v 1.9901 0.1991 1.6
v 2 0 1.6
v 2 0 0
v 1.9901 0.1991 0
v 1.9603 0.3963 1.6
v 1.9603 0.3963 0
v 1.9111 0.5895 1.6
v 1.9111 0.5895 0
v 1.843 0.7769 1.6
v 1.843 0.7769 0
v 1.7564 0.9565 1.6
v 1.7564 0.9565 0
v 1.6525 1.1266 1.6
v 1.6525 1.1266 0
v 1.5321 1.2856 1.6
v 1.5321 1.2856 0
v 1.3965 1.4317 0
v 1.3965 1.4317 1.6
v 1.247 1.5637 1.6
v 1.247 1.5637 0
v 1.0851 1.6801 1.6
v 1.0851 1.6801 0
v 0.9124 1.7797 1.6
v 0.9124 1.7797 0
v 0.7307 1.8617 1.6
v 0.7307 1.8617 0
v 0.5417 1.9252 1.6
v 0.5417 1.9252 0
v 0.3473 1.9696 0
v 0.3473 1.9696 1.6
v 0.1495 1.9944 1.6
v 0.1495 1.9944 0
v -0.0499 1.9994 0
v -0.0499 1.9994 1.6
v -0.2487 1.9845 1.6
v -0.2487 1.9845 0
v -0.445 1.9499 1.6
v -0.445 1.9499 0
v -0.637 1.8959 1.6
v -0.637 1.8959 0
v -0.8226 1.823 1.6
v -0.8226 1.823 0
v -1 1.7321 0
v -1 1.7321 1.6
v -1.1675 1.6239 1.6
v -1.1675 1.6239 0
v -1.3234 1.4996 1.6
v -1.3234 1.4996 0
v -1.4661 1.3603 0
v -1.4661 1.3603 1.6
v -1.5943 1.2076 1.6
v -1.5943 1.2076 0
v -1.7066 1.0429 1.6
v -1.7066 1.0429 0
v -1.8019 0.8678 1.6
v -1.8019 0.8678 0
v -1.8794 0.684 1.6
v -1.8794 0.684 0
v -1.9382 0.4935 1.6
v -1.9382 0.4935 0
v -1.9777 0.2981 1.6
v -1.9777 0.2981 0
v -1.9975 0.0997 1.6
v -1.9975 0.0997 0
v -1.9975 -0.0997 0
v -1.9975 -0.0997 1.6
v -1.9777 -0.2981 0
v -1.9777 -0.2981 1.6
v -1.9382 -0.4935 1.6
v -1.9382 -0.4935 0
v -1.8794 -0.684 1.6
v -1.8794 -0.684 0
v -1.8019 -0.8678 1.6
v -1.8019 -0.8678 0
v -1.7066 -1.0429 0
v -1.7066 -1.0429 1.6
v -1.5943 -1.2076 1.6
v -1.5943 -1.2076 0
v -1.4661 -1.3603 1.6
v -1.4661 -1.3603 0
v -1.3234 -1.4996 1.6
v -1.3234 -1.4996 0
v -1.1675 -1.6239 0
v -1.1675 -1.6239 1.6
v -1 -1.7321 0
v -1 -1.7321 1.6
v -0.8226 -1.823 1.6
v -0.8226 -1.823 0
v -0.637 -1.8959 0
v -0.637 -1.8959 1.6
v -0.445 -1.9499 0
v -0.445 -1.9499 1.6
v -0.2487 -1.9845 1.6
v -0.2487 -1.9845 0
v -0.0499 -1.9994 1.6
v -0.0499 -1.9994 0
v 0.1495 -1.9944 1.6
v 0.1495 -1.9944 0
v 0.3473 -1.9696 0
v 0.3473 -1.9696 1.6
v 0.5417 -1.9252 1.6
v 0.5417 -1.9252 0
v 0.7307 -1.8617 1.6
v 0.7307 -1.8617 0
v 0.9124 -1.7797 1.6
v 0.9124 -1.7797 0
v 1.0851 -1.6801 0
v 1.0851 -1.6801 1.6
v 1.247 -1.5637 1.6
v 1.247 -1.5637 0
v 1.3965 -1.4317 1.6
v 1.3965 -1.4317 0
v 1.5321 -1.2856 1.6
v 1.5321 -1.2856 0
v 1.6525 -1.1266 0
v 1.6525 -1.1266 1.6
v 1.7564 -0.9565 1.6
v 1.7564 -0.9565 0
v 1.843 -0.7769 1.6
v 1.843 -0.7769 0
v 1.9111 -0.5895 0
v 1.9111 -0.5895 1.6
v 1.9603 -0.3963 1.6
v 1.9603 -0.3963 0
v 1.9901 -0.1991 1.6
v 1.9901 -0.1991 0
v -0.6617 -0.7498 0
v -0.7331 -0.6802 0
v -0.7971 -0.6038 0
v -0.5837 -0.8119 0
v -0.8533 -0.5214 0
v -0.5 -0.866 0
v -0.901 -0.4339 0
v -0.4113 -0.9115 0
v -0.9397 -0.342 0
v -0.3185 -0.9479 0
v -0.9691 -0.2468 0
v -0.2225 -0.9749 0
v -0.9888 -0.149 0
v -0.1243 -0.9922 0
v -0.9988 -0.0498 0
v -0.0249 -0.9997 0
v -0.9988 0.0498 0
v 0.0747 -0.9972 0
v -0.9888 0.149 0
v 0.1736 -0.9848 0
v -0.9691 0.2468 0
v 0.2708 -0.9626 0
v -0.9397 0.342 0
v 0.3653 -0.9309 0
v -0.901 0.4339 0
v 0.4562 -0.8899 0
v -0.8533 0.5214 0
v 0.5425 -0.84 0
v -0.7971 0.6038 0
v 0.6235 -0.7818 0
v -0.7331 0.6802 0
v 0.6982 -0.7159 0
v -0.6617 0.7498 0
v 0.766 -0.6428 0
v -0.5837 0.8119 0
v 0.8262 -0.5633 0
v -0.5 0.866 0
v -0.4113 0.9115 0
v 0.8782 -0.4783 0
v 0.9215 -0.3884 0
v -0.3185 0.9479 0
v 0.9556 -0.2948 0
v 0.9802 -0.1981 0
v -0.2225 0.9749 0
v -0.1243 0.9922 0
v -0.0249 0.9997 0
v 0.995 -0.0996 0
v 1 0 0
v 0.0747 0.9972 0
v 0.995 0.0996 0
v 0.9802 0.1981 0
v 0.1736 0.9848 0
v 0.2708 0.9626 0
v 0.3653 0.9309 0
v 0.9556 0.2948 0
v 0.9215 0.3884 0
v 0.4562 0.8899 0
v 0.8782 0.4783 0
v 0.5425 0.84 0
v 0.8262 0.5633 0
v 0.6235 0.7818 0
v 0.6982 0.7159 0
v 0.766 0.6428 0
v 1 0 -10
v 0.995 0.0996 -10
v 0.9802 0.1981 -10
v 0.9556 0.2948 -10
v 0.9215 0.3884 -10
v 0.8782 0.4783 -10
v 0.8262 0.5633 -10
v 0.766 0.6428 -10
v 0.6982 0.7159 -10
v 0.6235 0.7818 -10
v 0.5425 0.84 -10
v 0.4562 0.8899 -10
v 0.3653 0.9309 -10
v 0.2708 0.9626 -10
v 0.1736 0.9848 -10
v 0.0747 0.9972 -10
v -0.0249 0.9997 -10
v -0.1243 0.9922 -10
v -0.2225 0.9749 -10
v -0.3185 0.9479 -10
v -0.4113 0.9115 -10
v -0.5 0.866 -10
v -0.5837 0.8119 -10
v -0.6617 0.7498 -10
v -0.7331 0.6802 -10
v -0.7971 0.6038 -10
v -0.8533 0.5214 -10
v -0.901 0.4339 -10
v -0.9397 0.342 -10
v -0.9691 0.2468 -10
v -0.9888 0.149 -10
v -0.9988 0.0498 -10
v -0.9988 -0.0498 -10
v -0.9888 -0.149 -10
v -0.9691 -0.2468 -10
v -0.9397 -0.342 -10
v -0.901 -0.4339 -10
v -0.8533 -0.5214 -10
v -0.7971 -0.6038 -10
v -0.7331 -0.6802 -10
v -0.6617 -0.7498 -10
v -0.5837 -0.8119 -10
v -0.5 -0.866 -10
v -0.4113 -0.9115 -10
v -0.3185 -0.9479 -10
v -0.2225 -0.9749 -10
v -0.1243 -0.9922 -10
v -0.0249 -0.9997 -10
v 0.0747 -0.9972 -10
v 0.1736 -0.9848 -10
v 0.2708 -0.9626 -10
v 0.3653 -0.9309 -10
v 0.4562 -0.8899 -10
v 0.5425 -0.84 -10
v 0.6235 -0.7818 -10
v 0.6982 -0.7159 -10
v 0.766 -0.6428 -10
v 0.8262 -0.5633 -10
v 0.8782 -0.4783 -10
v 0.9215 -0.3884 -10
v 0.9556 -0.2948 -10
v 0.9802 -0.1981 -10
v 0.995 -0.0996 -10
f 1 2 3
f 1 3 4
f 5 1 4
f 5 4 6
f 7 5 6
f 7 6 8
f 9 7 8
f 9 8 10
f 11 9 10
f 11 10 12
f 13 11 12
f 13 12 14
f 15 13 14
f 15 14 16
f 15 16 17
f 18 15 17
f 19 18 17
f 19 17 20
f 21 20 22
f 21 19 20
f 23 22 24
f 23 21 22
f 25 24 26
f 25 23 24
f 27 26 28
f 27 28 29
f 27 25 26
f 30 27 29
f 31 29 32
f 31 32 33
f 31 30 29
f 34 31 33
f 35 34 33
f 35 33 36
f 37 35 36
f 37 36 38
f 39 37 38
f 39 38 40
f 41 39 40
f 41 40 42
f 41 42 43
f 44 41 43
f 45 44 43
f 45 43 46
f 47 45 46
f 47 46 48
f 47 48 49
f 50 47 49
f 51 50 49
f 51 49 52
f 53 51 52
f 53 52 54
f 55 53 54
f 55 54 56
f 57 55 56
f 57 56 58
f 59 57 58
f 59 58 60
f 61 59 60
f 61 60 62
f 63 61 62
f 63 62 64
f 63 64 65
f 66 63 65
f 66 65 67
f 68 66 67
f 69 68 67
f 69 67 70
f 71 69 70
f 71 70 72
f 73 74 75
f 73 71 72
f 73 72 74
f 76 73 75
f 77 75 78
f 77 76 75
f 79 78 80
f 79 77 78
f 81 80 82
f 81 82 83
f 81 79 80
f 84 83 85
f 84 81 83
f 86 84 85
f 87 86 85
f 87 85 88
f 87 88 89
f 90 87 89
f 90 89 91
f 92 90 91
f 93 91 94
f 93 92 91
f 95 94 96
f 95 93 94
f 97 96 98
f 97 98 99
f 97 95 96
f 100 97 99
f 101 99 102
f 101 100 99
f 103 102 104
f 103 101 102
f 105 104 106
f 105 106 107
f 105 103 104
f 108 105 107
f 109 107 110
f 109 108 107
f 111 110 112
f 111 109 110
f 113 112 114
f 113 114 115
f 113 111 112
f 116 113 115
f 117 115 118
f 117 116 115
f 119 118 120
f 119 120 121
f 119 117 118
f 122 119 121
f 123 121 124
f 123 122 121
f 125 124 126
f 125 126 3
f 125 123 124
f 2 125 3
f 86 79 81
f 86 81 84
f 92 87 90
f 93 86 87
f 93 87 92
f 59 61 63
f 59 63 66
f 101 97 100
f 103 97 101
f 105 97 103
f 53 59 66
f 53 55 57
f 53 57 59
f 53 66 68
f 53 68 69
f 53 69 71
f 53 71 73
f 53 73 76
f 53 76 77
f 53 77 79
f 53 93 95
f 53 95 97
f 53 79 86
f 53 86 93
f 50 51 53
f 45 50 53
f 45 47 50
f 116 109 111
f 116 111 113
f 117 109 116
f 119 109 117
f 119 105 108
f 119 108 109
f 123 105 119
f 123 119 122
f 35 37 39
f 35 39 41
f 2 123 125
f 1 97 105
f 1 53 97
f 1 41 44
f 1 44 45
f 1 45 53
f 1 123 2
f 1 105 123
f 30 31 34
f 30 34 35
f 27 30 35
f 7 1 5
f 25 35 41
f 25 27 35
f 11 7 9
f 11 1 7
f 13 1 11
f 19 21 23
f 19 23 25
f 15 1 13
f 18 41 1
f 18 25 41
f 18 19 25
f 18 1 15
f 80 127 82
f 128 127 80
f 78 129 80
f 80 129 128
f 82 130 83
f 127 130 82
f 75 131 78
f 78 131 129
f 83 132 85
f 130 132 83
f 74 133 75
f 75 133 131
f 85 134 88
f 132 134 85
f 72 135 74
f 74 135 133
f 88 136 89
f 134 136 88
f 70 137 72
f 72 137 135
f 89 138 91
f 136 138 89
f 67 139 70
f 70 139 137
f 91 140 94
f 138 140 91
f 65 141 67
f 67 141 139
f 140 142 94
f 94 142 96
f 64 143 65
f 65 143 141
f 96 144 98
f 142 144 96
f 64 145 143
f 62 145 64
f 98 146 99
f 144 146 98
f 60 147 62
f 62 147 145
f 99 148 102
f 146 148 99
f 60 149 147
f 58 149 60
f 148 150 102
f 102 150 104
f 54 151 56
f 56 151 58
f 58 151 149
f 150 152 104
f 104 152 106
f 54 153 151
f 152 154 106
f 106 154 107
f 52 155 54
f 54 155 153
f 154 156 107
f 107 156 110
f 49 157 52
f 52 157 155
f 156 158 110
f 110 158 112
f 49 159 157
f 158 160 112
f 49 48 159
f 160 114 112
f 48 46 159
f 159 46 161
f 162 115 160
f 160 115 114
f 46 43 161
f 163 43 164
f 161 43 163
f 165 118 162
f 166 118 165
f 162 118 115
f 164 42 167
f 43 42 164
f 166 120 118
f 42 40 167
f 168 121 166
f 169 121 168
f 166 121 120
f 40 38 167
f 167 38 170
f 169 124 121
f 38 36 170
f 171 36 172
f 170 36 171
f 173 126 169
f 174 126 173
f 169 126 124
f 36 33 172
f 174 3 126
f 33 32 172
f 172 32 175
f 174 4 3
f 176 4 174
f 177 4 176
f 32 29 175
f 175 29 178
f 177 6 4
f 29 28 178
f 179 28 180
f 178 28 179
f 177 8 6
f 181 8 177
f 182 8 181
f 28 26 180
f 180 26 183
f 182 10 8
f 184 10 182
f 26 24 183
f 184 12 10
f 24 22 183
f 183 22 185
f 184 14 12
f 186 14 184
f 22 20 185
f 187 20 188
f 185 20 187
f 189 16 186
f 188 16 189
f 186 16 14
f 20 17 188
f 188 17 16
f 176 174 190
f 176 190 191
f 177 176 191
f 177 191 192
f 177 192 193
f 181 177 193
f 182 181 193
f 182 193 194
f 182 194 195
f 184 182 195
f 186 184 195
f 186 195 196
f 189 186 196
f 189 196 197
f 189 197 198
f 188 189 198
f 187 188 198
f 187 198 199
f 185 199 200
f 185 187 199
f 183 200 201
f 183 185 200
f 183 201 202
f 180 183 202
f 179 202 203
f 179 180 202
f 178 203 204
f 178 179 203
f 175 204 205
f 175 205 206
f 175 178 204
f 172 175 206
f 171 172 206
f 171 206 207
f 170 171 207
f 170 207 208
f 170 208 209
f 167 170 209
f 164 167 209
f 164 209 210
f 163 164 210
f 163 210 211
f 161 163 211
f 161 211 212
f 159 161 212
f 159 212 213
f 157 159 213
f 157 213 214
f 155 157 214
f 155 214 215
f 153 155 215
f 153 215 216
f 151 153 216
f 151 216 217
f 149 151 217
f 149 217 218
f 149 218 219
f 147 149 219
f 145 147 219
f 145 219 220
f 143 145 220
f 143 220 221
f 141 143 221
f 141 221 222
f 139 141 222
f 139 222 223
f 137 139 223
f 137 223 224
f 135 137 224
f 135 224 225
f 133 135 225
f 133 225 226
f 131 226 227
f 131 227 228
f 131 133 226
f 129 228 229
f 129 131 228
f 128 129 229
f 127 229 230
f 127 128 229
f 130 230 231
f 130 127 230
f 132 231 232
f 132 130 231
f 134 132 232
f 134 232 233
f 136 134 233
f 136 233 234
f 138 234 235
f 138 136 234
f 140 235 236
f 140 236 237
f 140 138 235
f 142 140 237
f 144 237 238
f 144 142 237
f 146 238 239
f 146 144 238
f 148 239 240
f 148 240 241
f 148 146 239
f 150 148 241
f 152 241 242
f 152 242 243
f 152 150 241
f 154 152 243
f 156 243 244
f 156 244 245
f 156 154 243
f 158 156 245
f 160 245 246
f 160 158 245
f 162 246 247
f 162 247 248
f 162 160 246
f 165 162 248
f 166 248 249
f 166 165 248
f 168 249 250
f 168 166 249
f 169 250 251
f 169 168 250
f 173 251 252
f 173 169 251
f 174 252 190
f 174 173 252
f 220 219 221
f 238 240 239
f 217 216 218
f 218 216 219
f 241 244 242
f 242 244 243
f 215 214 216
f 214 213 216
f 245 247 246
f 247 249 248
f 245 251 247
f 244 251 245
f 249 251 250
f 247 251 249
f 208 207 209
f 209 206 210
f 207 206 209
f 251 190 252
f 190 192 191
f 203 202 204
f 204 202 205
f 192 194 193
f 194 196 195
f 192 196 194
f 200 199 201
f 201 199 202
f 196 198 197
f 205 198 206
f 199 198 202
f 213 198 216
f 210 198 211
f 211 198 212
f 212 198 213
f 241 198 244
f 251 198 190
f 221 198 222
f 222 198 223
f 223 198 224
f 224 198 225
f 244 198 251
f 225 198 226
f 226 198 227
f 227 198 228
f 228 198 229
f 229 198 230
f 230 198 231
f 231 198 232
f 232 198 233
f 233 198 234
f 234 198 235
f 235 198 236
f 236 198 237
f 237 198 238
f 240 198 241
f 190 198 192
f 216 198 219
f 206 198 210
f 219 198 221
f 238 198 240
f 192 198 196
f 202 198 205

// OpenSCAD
// Generated by the canonical parent Python sources and validated exchange pipeline.
polyhedron(points=[[1.9900615215301514, 0.1991356909275055, 1.600000023841858], [2.0, 0.0, 1.600000023841858], [2.0, 0.0, 0.0], [1.9900615215301514, 0.1991356909275055, 0.0], [1.9603450298309326, 0.3962922990322113, 1.600000023841858], [1.9603450298309326, 0.3962922990322113, 0.0], [1.911145567893982, 0.5895103216171265, 1.600000023841858], [1.911145567893982, 0.5895103216171265, 0.0], [1.8429523706436157, 0.7768695950508118, 1.600000023841858], [1.8429523706436157, 0.7768695950508118, 0.0], [1.7564431428909302, 0.9565079808235168, 1.600000023841858], [1.7564431428909302, 0.9565079808235168, 0.0], [1.652477502822876, 1.1266400814056396, 1.600000023841858], [1.652477502822876, 1.1266400814056396, 0.0], [1.5320888757705688, 1.285575270652771, 1.600000023841858], [1.5320888757705688, 1.285575270652771, 0.0], [1.3964736461639404, 1.4317337274551392, 0.0], [1.3964736461639404, 1.4317337274551392, 1.600000023841858], [1.2469795942306519, 1.5636630058288574, 1.600000023841858], [1.2469795942306519, 1.5636630058288574, 0.0], [1.085092544555664, 1.6800518035888672, 1.600000023841858], [1.085092544555664, 1.6800518035888672, 0.0], [0.9124212861061096, 1.7797436714172363, 1.600000023841858], [0.9124212861061096, 1.7797436714172363, 0.0], [0.7306820750236511, 1.8617475032806396, 1.600000023841858], [0.7306820750236511, 1.8617475032806396, 0.0], [0.5416809320449829, 1.9252485036849976, 1.600000023841858], [0.5416809320449829, 1.9252485036849976, 0.0], [0.3472963571548462, 1.9696154594421387, 0.0], [0.3472963571548462, 1.9696154594421387, 1.600000023841858], [0.14946018159389496, 1.9944076538085938, 1.600000023841858], [0.14946018159389496, 1.9944076538085938, 0.0], [-0.04986138269305229, 1.9993783235549927, 0.0], [-0.04986138269305229, 1.9993783235549927, 1.600000023841858], [-0.24868741631507874, 1.9844783544540405, 1.600000023841858], [-0.24868741631507874, 1.9844783544540405, 0.0], [-0.44504186511039734, 1.9498558044433594, 1.600000023841858], [-0.44504186511039734, 1.9498558044433594, 0.0], [-0.6369733214378357, 1.8958547115325928, 1.600000023841858], [-0.6369733214378357, 1.8958547115325928, 0.0], [-0.8225741982460022, 1.8230117559432983, 1.600000023841858], [-0.8225741982460022, 1.8230117559432983, 0.0], [-1.0, 1.7320507764816284, 0.0], [-1.0, 1.7320507764816284, 1.600000023841858], [-1.167487382888794, 1.6238759756088257, 1.600000023841858], [-1.167487382888794, 1.6238759756088257, 0.0], [-1.3233716487884521, 1.499562382698059, 1.600000023841858], [-1.3233716487884521, 1.499562382698059, 0.0], [-1.4661037921905518, 1.360345482826233, 0.0], [-1.4661037921905518, 1.360345482826233, 1.600000023841858], [-1.5942649841308594, 1.2076088190078735, 1.600000023841858], [-1.5942649841308594, 1.2076088190078735, 0.0], [-1.706581711769104, 1.0428704023361206, 1.600000023841858], [-1.706581711769104, 1.0428704023361206, 0.0], [-1.8019376993179321, 0.8677674531936646, 1.600000023841858], [-1.8019376993179321, 0.8677674531936646, 0.0], [-1.879385232925415, 0.6840403079986572, 1.600000023841858], [-1.879385232925415, 0.6840403079986572, 0.0], [-1.9381545782089233, 0.4935148060321808, 1.600000023841858], [-1.9381545782089233, 0.4935148060321808, 0.0], [-1.9776616096496582, 0.2980845272541046, 1.600000023841858], [-1.9776616096496582, 0.2980845272541046, 0.0], [-1.9975138902664185, 0.09969177097082138, 1.600000023841858], [-1.9975138902664185, 0.09969177097082138, 0.0], [-1.9975138902664185, -0.09969177097082138, 0.0], [-1.9975138902664185, -0.09969177097082138, 1.600000023841858], [-1.9776616096496582, -0.2980845272541046, 0.0], [-1.9776616096496582, -0.2980845272541046, 1.600000023841858], [-1.9381545782089233, -0.4935148060321808, 1.600000023841858], [-1.9381545782089233, -0.4935148060321808, 0.0], [-1.879385232925415, -0.6840403079986572, 1.600000023841858], [-1.879385232925415, -0.6840403079986572, 0.0], [-1.8019376993179321, -0.8677674531936646, 1.600000023841858], [-1.8019376993179321, -0.8677674531936646, 0.0], [-1.706581711769104, -1.0428704023361206, 0.0], [-1.706581711769104, -1.0428704023361206, 1.600000023841858], [-1.5942649841308594, -1.2076088190078735, 1.600000023841858], [-1.5942649841308594, -1.2076088190078735, 0.0], [-1.4661037921905518, -1.360345482826233, 1.600000023841858], [-1.4661037921905518, -1.360345482826233, 0.0], [-1.3233716487884521, -1.499562382698059, 1.600000023841858], [-1.3233716487884521, -1.499562382698059, 0.0], [-1.167487382888794, -1.6238759756088257, 0.0], [-1.167487382888794, -1.6238759756088257, 1.600000023841858], [-1.0, -1.7320507764816284, 0.0], [-1.0, -1.7320507764816284, 1.600000023841858], [-0.8225741982460022, -1.8230117559432983, 1.600000023841858], [-0.8225741982460022, -1.8230117559432983, 0.0], [-0.6369733214378357, -1.8958547115325928, 0.0], [-0.6369733214378357, -1.8958547115325928, 1.600000023841858], [-0.44504186511039734, -1.9498558044433594, 0.0], [-0.44504186511039734, -1.9498558044433594, 1.600000023841858], [-0.24868741631507874, -1.9844783544540405, 1.600000023841858], [-0.24868741631507874, -1.9844783544540405, 0.0], [-0.04986138269305229, -1.9993783235549927, 1.600000023841858], [-0.04986138269305229, -1.9993783235549927, 0.0], [0.14946018159389496, -1.9944076538085938, 1.600000023841858], [0.14946018159389496, -1.9944076538085938, 0.0], [0.3472963571548462, -1.9696154594421387, 0.0], [0.3472963571548462, -1.9696154594421387, 1.600000023841858], [0.5416809320449829, -1.9252485036849976, 1.600000023841858], [0.5416809320449829, -1.9252485036849976, 0.0], [0.7306820750236511, -1.8617475032806396, 1.600000023841858], [0.7306820750236511, -1.8617475032806396, 0.0], [0.9124212861061096, -1.7797436714172363, 1.600000023841858], [0.9124212861061096, -1.7797436714172363, 0.0], [1.085092544555664, -1.6800518035888672, 0.0], [1.085092544555664, -1.6800518035888672, 1.600000023841858], [1.2469795942306519, -1.5636630058288574, 1.600000023841858], [1.2469795942306519, -1.5636630058288574, 0.0], [1.3964736461639404, -1.4317337274551392, 1.600000023841858], [1.3964736461639404, -1.4317337274551392, 0.0], [1.5320888757705688, -1.285575270652771, 1.600000023841858], [1.5320888757705688, -1.285575270652771, 0.0], [1.652477502822876, -1.1266400814056396, 0.0], [1.652477502822876, -1.1266400814056396, 1.600000023841858], [1.7564431428909302, -0.9565079808235168, 1.600000023841858], [1.7564431428909302, -0.9565079808235168, 0.0], [1.8429523706436157, -0.7768695950508118, 1.600000023841858], [1.8429523706436157, -0.7768695950508118, 0.0], [1.911145567893982, -0.5895103216171265, 0.0], [1.911145567893982, -0.5895103216171265, 1.600000023841858], [1.9603450298309326, -0.3962922990322113, 1.600000023841858], [1.9603450298309326, -0.3962922990322113, 0.0], [1.9900615215301514, -0.1991356909275055, 1.600000023841858], [1.9900615215301514, -0.1991356909275055, 0.0], [-0.6616858243942261, -0.7497811913490295, 0.0], [-0.7330518960952759, -0.6801727414131165, 0.0], [-0.7971324920654297, -0.6038044095039368, 0.0], [-0.583743691444397, -0.8119379878044128, 0.0], [-0.853290855884552, -0.5214352011680603, 0.0], [-0.5, -0.8660253882408142, 0.0], [-0.9009688496589661, -0.4338837265968323, 0.0], [-0.4112870991230011, -0.9115058779716492, 0.0], [-0.9396926164627075, -0.3420201539993286, 0.0], [-0.31848666071891785, -0.9479273557662964, 0.0], [-0.9690772891044617, -0.2467574030160904, 0.0], [-0.22252093255519867, -0.9749279022216797, 0.0], [-0.9888308048248291, -0.1490422636270523, 0.0], [-0.12434370815753937, -0.9922391772270203, 0.0], [-0.9987569451332092, -0.04984588548541069, 0.0], [-0.024930691346526146, -0.9996891617774963, 0.0], [-0.9987569451332092, 0.04984588548541069, 0.0], [0.07473009079694748, -0.9972038269042969, 0.0], [-0.9888308048248291, 0.1490422636270523, 0.0], [0.1736481785774231, -0.9848077297210693, 0.0], [-0.9690772891044617, 0.2467574030160904, 0.0], [0.27084046602249146, -0.9626242518424988, 0.0], [-0.9396926164627075, 0.3420201539993286, 0.0], [0.36534103751182556, -0.9308737516403198, 0.0], [-0.9009688496589661, 0.4338837265968323, 0.0], [0.4562106430530548, -0.8898718357086182, 0.0], [-0.853290855884552, 0.5214352011680603, 0.0], [0.542546272277832, -0.8400259017944336, 0.0], [-0.7971324920654297, 0.6038044095039368, 0.0], [0.6234897971153259, -0.7818315029144287, 0.0], [-0.7330518960952759, 0.6801727414131165, 0.0], [0.6982368230819702, -0.7158668637275696, 0.0], [-0.6616858243942261, 0.7497811913490295, 0.0], [0.7660444378852844, -0.6427876353263855, 0.0], [-0.583743691444397, 0.8119379878044128, 0.0], [0.826238751411438, -0.5633200407028198, 0.0], [-0.5, 0.8660253882408142, 0.0], [-0.4112870991230011, 0.9115058779716492, 0.0], [0.8782215714454651, -0.4782539904117584, 0.0], [0.9214761853218079, -0.3884347975254059, 0.0], [-0.31848666071891785, 0.9479273557662964, 0.0], [0.955572783946991, -0.29475516080856323, 0.0], [0.9801725149154663, -0.19814614951610565, 0.0], [-0.22252093255519867, 0.9749279022216797, 0.0], [-0.12434370815753937, 0.9922391772270203, 0.0], [-0.024930691346526146, 0.9996891617774963, 0.0], [0.9950307607650757, -0.09956784546375275, 0.0], [1.0, 0.0, 0.0], [0.07473009079694748, 0.9972038269042969, 0.0], [0.9950307607650757, 0.09956784546375275, 0.0], [0.9801725149154663, 0.19814614951610565, 0.0], [0.1736481785774231, 0.9848077297210693, 0.0], [0.27084046602249146, 0.9626242518424988, 0.0], [0.36534103751182556, 0.9308737516403198, 0.0], [0.955572783946991, 0.29475516080856323, 0.0], [0.9214761853218079, 0.3884347975254059, 0.0], [0.4562106430530548, 0.8898718357086182, 0.0], [0.8782215714454651, 0.4782539904117584, 0.0], [0.542546272277832, 0.8400259017944336, 0.0], [0.826238751411438, 0.5633200407028198, 0.0], [0.6234897971153259, 0.7818315029144287, 0.0], [0.6982368230819702, 0.7158668637275696, 0.0], [0.7660444378852844, 0.6427876353263855, 0.0], [1.0, 0.0, -10.0], [0.9950307607650757, 0.09956784546375275, -10.0], [0.9801725149154663, 0.19814614951610565, -10.0], [0.955572783946991, 0.29475516080856323, -10.0], [0.9214761853218079, 0.3884347975254059, -10.0], [0.8782215714454651, 0.4782539904117584, -10.0], [0.826238751411438, 0.5633200407028198, -10.0], [0.7660444378852844, 0.6427876353263855, -10.0], [0.6982368230819702, 0.7158668637275696, -10.0], [0.6234897971153259, 0.7818315029144287, -10.0], [0.542546272277832, 0.8400259017944336, -10.0], [0.4562106430530548, 0.8898718357086182, -10.0], [0.36534103751182556, 0.9308737516403198, -10.0], [0.27084046602249146, 0.9626242518424988, -10.0], [0.1736481785774231, 0.9848077297210693, -10.0], [0.07473009079694748, 0.9972038269042969, -10.0], [-0.024930691346526146, 0.9996891617774963, -10.0], [-0.12434370815753937, 0.9922391772270203, -10.0], [-0.22252093255519867, 0.9749279022216797, -10.0], [-0.31848666071891785, 0.9479273557662964, -10.0], [-0.4112870991230011, 0.9115058779716492, -10.0], [-0.5, 0.8660253882408142, -10.0], [-0.583743691444397, 0.8119379878044128, -10.0], [-0.6616858243942261, 0.7497811913490295, -10.0], [-0.7330518960952759, 0.6801727414131165, -10.0], [-0.7971324920654297, 0.6038044095039368, -10.0], [-0.853290855884552, 0.5214352011680603, -10.0], [-0.9009688496589661, 0.4338837265968323, -10.0], [-0.9396926164627075, 0.3420201539993286, -10.0], [-0.9690772891044617, 0.2467574030160904, -10.0], [-0.9888308048248291, 0.1490422636270523, -10.0], [-0.9987569451332092, 0.04984588548541069, -10.0], [-0.9987569451332092, -0.04984588548541069, -10.0], [-0.9888308048248291, -0.1490422636270523, -10.0], [-0.9690772891044617, -0.2467574030160904, -10.0], [-0.9396926164627075, -0.3420201539993286, -10.0], [-0.9009688496589661, -0.4338837265968323, -10.0], [-0.853290855884552, -0.5214352011680603, -10.0], [-0.7971324920654297, -0.6038044095039368, -10.0], [-0.7330518960952759, -0.6801727414131165, -10.0], [-0.6616858243942261, -0.7497811913490295, -10.0], [-0.583743691444397, -0.8119379878044128, -10.0], [-0.5, -0.8660253882408142, -10.0], [-0.4112870991230011, -0.9115058779716492, -10.0], [-0.31848666071891785, -0.9479273557662964, -10.0], [-0.22252093255519867, -0.9749279022216797, -10.0], [-0.12434370815753937, -0.9922391772270203, -10.0], [-0.024930691346526146, -0.9996891617774963, -10.0], [0.07473009079694748, -0.9972038269042969, -10.0], [0.1736481785774231, -0.9848077297210693, -10.0], [0.27084046602249146, -0.9626242518424988, -10.0], [0.36534103751182556, -0.9308737516403198, -10.0], [0.4562106430530548, -0.8898718357086182, -10.0], [0.542546272277832, -0.8400259017944336, -10.0], [0.6234897971153259, -0.7818315029144287, -10.0], [0.6982368230819702, -0.7158668637275696, -10.0], [0.7660444378852844, -0.6427876353263855, -10.0], [0.826238751411438, -0.5633200407028198, -10.0], [0.8782215714454651, -0.4782539904117584, -10.0], [0.9214761853218079, -0.3884347975254059, -10.0], [0.955572783946991, -0.29475516080856323, -10.0], [0.9801725149154663, -0.19814614951610565, -10.0], [0.9950307607650757, -0.09956784546375275, -10.0]],faces=[[2, 1, 0], [3, 2, 0], [3, 0, 4], [5, 3, 4], [5, 4, 6], [7, 5, 6], [7, 6, 8], [9, 7, 8], [9, 8, 10], [11, 9, 10], [11, 10, 12], [13, 11, 12], [13, 12, 14], [15, 13, 14], [16, 15, 14], [16, 14, 17], [16, 17, 18], [19, 16, 18], [21, 19, 20], [19, 18, 20], [23, 21, 22], [21, 20, 22], [25, 23, 24], [23, 22, 24], [27, 25, 26], [28, 27, 26], [25, 24, 26], [28, 26, 29], [31, 28, 30], [32, 31, 30], [28, 29, 30], [32, 30, 33], [32, 33, 34], [35, 32, 34], [35, 34, 36], [37, 35, 36], [37, 36, 38], [39, 37, 38], [39, 38, 40], [41, 39, 40], [42, 41, 40], [42, 40, 43], [42, 43, 44], [45, 42, 44], [45, 44, 46], [47, 45, 46], [48, 47, 46], [48, 46, 49], [48, 49, 50], [51, 48, 50], [51, 50, 52], [53, 51, 52], [53, 52, 54], [55, 53, 54], [55, 54, 56], [57, 55, 56], [57, 56, 58], [59, 57, 58], [59, 58, 60], [61, 59, 60], [61, 60, 62], [63, 61, 62], [64, 63, 62], [64, 62, 65], [66, 64, 65], [66, 65, 67], [66, 67, 68], [69, 66, 68], [69, 68, 70], [71, 69, 70], [74, 73, 72], [71, 70, 72], [73, 71, 72], [74, 72, 75], [77, 74, 76], [74, 75, 76], [79, 77, 78], [77, 76, 78], [81, 79, 80], [82, 81, 80], [79, 78, 80], [84, 82, 83], [82, 80, 83], [84, 83, 85], [84, 85, 86], [87, 84, 86], [88, 87, 86], [88, 86, 89], [90, 88, 89], [90, 89, 91], [93, 90, 92], [90, 91, 92], [95, 93, 94], [93, 92, 94], [97, 95, 96], [98, 97, 96], [95, 94, 96], [98, 96, 99], [101, 98, 100], [98, 99, 100], [103, 101, 102], [101, 100, 102], [105, 103, 104], [106, 105, 104], [103, 102, 104], [106, 104, 107], [109, 106, 108], [106, 107, 108], [111, 109, 110], [109, 108, 110], [113, 111, 112], [114, 113, 112], [111, 110, 112], [114, 112, 115], [117, 114, 116], [114, 115, 116], [119, 117, 118], [120, 119, 118], [117, 116, 118], [120, 118, 121], [123, 120, 122], [120, 121, 122], [125, 123, 124], [2, 125, 124], [123, 122, 124], [2, 124, 1], [80, 78, 85], [83, 80, 85], [89, 86, 91], [86, 85, 92], [91, 86, 92], [62, 60, 58], [65, 62, 58], [99, 96, 100], [100, 96, 102], [102, 96, 104], [65, 58, 52], [56, 54, 52], [58, 56, 52], [67, 65, 52], [68, 67, 52], [70, 68, 52], [72, 70, 52], [75, 72, 52], [76, 75, 52], [78, 76, 52], [94, 92, 52], [96, 94, 52], [85, 78, 52], [92, 85, 52], [52, 50, 49], [52, 49, 44], [49, 46, 44], [110, 108, 115], [112, 110, 115], [115, 108, 116], [116, 108, 118], [107, 104, 118], [108, 107, 118], [118, 104, 122], [121, 118, 122], [38, 36, 34], [40, 38, 34], [124, 122, 1], [104, 96, 0], [96, 52, 0], [43, 40, 0], [44, 43, 0], [52, 44, 0], [1, 122, 0], [122, 104, 0], [33, 30, 29], [34, 33, 29], [34, 29, 26], [4, 0, 6], [40, 34, 24], [34, 26, 24], [8, 6, 10], [6, 0, 10], [10, 0, 12], [22, 20, 18], [24, 22, 18], [12, 0, 14], [0, 40, 17], [40, 24, 17], [24, 18, 17], [14, 0, 17], [81, 126, 79], [79, 126, 127], [79, 128, 77], [127, 128, 79], [82, 129, 81], [81, 129, 126], [77, 130, 74], [128, 130, 77], [84, 131, 82], [82, 131, 129], [74, 132, 73], [130, 132, 74], [87, 133, 84], [84, 133, 131], [73, 134, 71], [132, 134, 73], [88, 135, 87], [87, 135, 133], [71, 136, 69], [134, 136, 71], [90, 137, 88], [88, 137, 135], [69, 138, 66], [136, 138, 69], [93, 139, 90], [90, 139, 137], [66, 140, 64], [138, 140, 66], [93, 141, 139], [95, 141, 93], [64, 142, 63], [140, 142, 64], [97, 143, 95], [95, 143, 141], [142, 144, 63], [63, 144, 61], [98, 145, 97], [97, 145, 143], [61, 146, 59], [144, 146, 61], [101, 147, 98], [98, 147, 145], [146, 148, 59], [59, 148, 57], [101, 149, 147], [103, 149, 101], [55, 150, 53], [57, 150, 55], [148, 150, 57], [103, 151, 149], [105, 151, 103], [150, 152, 53], [105, 153, 151], [106, 153, 105], [53, 154, 51], [152, 154, 53], [106, 155, 153], [109, 155, 106], [51, 156, 48], [154, 156, 51], [109, 157, 155], [111, 157, 109], [156, 158, 48], [111, 159, 157], [158, 47, 48], [111, 113, 159], [158, 45, 47], [160, 45, 158], [159, 114, 161], [113, 114, 159], [160, 42, 45], [163, 42, 162], [162, 42, 160], [161, 117, 164], [164, 117, 165], [114, 117, 161], [166, 41, 163], [163, 41, 42], [117, 119, 165], [166, 39, 41], [165, 120, 167], [167, 120, 168], [119, 120, 165], [166, 37, 39], [169, 37, 166], [120, 123, 168], [169, 35, 37], [171, 35, 170], [170, 35, 169], [168, 125, 172], [172, 125, 173], [123, 125, 168], [171, 32, 35], [125, 2, 173], [171, 31, 32], [174, 31, 171], [2, 3, 173], [173, 3, 175], [175, 3, 176], [174, 28, 31], [177, 28, 174], [3, 5, 176], [177, 27, 28], [179, 27, 178], [178, 27, 177], [5, 7, 176], [176, 7, 180], [180, 7, 181], [179, 25, 27], [182, 25, 179], [7, 9, 181], [181, 9, 183], [182, 23, 25], [9, 11, 183], [182, 21, 23], [184, 21, 182], [11, 13, 183], [183, 13, 185], [184, 19, 21], [187, 19, 186], [186, 19, 184], [185, 15, 188], [188, 15, 187], [13, 15, 185], [187, 16, 19], [15, 16, 187], [189, 173, 175], [190, 189, 175], [190, 175, 176], [191, 190, 176], [192, 191, 176], [192, 176, 180], [192, 180, 181], [193, 192, 181], [194, 193, 181], [194, 181, 183], [194, 183, 185], [195, 194, 185], [195, 185, 188], [196, 195, 188], [197, 196, 188], [197, 188, 187], [197, 187, 186], [198, 197, 186], [199, 198, 184], [198, 186, 184], [200, 199, 182], [199, 184, 182], [201, 200, 182], [201, 182, 179], [202, 201, 178], [201, 179, 178], [203, 202, 177], [202, 178, 177], [204, 203, 174], [205, 204, 174], [203, 177, 174], [205, 174, 171], [205, 171, 170], [206, 205, 170], [206, 170, 169], [207, 206, 169], [208, 207, 169], [208, 169, 166], [208, 166, 163], [209, 208, 163], [209, 163, 162], [210, 209, 162], [210, 162, 160], [211, 210, 160], [211, 160, 158], [212, 211, 158], [212, 158, 156], [213, 212, 156], [213, 156, 154], [214, 213, 154], [214, 154, 152], [215, 214, 152], [215, 152, 150], [216, 215, 150], [216, 150, 148], [217, 216, 148], [218, 217, 148], [218, 148, 146], [218, 146, 144], [219, 218, 144], [219, 144, 142], [220, 219, 142], [220, 142, 140], [221, 220, 140], [221, 140, 138], [222, 221, 138], [222, 138, 136], [223, 222, 136], [223, 136, 134], [224, 223, 134], [224, 134, 132], [225, 224, 132], [226, 225, 130], [227, 226, 130], [225, 132, 130], [228, 227, 128], [227, 130, 128], [228, 128, 127], [229, 228, 126], [228, 127, 126], [230, 229, 129], [229, 126, 129], [231, 230, 131], [230, 129, 131], [231, 131, 133], [232, 231, 133], [232, 133, 135], [233, 232, 135], [234, 233, 137], [233, 135, 137], [235, 234, 139], [236, 235, 139], [234, 137, 139], [236, 139, 141], [237, 236, 143], [236, 141, 143], [238, 237, 145], [237, 143, 145], [239, 238, 147], [240, 239, 147], [238, 145, 147], [240, 147, 149], [241, 240, 151], [242, 241, 151], [240, 149, 151], [242, 151, 153], [243, 242, 155], [244, 243, 155], [242, 153, 155], [244, 155, 157], [245, 244, 159], [244, 157, 159], [246, 245, 161], [247, 246, 161], [245, 159, 161], [247, 161, 164], [248, 247, 165], [247, 164, 165], [249, 248, 167], [248, 165, 167], [250, 249, 168], [249, 167, 168], [251, 250, 172], [250, 168, 172], [189, 251, 173], [251, 172, 173], [220, 218, 219], [238, 239, 237], [217, 215, 216], [218, 215, 217], [241, 243, 240], [242, 243, 241], [215, 213, 214], [215, 212, 213], [245, 246, 244], [247, 248, 246], [246, 250, 244], [244, 250, 243], [249, 250, 248], [248, 250, 246], [208, 206, 207], [209, 205, 208], [208, 205, 206], [251, 189, 250], [190, 191, 189], [203, 201, 202], [204, 201, 203], [192, 193, 191], [194, 195, 193], [193, 195, 191], [200, 198, 199], [201, 198, 200], [196, 197, 195], [205, 197, 204], [201, 197, 198], [215, 197, 212], [210, 197, 209], [211, 197, 210], [212, 197, 211], [243, 197, 240], [189, 197, 250], [221, 197, 220], [222, 197, 221], [223, 197, 222], [224, 197, 223], [250, 197, 243], [225, 197, 224], [226, 197, 225], [227, 197, 226], [228, 197, 227], [229, 197, 228], [230, 197, 229], [231, 197, 230], [232, 197, 231], [233, 197, 232], [234, 197, 233], [235, 197, 234], [236, 197, 235], [237, 197, 236], [240, 197, 239], [191, 197, 189], [218, 197, 215], [209, 197, 205], [220, 197, 218], [239, 197, 237], [195, 197, 191], [204, 197, 201]],convexity=10);
